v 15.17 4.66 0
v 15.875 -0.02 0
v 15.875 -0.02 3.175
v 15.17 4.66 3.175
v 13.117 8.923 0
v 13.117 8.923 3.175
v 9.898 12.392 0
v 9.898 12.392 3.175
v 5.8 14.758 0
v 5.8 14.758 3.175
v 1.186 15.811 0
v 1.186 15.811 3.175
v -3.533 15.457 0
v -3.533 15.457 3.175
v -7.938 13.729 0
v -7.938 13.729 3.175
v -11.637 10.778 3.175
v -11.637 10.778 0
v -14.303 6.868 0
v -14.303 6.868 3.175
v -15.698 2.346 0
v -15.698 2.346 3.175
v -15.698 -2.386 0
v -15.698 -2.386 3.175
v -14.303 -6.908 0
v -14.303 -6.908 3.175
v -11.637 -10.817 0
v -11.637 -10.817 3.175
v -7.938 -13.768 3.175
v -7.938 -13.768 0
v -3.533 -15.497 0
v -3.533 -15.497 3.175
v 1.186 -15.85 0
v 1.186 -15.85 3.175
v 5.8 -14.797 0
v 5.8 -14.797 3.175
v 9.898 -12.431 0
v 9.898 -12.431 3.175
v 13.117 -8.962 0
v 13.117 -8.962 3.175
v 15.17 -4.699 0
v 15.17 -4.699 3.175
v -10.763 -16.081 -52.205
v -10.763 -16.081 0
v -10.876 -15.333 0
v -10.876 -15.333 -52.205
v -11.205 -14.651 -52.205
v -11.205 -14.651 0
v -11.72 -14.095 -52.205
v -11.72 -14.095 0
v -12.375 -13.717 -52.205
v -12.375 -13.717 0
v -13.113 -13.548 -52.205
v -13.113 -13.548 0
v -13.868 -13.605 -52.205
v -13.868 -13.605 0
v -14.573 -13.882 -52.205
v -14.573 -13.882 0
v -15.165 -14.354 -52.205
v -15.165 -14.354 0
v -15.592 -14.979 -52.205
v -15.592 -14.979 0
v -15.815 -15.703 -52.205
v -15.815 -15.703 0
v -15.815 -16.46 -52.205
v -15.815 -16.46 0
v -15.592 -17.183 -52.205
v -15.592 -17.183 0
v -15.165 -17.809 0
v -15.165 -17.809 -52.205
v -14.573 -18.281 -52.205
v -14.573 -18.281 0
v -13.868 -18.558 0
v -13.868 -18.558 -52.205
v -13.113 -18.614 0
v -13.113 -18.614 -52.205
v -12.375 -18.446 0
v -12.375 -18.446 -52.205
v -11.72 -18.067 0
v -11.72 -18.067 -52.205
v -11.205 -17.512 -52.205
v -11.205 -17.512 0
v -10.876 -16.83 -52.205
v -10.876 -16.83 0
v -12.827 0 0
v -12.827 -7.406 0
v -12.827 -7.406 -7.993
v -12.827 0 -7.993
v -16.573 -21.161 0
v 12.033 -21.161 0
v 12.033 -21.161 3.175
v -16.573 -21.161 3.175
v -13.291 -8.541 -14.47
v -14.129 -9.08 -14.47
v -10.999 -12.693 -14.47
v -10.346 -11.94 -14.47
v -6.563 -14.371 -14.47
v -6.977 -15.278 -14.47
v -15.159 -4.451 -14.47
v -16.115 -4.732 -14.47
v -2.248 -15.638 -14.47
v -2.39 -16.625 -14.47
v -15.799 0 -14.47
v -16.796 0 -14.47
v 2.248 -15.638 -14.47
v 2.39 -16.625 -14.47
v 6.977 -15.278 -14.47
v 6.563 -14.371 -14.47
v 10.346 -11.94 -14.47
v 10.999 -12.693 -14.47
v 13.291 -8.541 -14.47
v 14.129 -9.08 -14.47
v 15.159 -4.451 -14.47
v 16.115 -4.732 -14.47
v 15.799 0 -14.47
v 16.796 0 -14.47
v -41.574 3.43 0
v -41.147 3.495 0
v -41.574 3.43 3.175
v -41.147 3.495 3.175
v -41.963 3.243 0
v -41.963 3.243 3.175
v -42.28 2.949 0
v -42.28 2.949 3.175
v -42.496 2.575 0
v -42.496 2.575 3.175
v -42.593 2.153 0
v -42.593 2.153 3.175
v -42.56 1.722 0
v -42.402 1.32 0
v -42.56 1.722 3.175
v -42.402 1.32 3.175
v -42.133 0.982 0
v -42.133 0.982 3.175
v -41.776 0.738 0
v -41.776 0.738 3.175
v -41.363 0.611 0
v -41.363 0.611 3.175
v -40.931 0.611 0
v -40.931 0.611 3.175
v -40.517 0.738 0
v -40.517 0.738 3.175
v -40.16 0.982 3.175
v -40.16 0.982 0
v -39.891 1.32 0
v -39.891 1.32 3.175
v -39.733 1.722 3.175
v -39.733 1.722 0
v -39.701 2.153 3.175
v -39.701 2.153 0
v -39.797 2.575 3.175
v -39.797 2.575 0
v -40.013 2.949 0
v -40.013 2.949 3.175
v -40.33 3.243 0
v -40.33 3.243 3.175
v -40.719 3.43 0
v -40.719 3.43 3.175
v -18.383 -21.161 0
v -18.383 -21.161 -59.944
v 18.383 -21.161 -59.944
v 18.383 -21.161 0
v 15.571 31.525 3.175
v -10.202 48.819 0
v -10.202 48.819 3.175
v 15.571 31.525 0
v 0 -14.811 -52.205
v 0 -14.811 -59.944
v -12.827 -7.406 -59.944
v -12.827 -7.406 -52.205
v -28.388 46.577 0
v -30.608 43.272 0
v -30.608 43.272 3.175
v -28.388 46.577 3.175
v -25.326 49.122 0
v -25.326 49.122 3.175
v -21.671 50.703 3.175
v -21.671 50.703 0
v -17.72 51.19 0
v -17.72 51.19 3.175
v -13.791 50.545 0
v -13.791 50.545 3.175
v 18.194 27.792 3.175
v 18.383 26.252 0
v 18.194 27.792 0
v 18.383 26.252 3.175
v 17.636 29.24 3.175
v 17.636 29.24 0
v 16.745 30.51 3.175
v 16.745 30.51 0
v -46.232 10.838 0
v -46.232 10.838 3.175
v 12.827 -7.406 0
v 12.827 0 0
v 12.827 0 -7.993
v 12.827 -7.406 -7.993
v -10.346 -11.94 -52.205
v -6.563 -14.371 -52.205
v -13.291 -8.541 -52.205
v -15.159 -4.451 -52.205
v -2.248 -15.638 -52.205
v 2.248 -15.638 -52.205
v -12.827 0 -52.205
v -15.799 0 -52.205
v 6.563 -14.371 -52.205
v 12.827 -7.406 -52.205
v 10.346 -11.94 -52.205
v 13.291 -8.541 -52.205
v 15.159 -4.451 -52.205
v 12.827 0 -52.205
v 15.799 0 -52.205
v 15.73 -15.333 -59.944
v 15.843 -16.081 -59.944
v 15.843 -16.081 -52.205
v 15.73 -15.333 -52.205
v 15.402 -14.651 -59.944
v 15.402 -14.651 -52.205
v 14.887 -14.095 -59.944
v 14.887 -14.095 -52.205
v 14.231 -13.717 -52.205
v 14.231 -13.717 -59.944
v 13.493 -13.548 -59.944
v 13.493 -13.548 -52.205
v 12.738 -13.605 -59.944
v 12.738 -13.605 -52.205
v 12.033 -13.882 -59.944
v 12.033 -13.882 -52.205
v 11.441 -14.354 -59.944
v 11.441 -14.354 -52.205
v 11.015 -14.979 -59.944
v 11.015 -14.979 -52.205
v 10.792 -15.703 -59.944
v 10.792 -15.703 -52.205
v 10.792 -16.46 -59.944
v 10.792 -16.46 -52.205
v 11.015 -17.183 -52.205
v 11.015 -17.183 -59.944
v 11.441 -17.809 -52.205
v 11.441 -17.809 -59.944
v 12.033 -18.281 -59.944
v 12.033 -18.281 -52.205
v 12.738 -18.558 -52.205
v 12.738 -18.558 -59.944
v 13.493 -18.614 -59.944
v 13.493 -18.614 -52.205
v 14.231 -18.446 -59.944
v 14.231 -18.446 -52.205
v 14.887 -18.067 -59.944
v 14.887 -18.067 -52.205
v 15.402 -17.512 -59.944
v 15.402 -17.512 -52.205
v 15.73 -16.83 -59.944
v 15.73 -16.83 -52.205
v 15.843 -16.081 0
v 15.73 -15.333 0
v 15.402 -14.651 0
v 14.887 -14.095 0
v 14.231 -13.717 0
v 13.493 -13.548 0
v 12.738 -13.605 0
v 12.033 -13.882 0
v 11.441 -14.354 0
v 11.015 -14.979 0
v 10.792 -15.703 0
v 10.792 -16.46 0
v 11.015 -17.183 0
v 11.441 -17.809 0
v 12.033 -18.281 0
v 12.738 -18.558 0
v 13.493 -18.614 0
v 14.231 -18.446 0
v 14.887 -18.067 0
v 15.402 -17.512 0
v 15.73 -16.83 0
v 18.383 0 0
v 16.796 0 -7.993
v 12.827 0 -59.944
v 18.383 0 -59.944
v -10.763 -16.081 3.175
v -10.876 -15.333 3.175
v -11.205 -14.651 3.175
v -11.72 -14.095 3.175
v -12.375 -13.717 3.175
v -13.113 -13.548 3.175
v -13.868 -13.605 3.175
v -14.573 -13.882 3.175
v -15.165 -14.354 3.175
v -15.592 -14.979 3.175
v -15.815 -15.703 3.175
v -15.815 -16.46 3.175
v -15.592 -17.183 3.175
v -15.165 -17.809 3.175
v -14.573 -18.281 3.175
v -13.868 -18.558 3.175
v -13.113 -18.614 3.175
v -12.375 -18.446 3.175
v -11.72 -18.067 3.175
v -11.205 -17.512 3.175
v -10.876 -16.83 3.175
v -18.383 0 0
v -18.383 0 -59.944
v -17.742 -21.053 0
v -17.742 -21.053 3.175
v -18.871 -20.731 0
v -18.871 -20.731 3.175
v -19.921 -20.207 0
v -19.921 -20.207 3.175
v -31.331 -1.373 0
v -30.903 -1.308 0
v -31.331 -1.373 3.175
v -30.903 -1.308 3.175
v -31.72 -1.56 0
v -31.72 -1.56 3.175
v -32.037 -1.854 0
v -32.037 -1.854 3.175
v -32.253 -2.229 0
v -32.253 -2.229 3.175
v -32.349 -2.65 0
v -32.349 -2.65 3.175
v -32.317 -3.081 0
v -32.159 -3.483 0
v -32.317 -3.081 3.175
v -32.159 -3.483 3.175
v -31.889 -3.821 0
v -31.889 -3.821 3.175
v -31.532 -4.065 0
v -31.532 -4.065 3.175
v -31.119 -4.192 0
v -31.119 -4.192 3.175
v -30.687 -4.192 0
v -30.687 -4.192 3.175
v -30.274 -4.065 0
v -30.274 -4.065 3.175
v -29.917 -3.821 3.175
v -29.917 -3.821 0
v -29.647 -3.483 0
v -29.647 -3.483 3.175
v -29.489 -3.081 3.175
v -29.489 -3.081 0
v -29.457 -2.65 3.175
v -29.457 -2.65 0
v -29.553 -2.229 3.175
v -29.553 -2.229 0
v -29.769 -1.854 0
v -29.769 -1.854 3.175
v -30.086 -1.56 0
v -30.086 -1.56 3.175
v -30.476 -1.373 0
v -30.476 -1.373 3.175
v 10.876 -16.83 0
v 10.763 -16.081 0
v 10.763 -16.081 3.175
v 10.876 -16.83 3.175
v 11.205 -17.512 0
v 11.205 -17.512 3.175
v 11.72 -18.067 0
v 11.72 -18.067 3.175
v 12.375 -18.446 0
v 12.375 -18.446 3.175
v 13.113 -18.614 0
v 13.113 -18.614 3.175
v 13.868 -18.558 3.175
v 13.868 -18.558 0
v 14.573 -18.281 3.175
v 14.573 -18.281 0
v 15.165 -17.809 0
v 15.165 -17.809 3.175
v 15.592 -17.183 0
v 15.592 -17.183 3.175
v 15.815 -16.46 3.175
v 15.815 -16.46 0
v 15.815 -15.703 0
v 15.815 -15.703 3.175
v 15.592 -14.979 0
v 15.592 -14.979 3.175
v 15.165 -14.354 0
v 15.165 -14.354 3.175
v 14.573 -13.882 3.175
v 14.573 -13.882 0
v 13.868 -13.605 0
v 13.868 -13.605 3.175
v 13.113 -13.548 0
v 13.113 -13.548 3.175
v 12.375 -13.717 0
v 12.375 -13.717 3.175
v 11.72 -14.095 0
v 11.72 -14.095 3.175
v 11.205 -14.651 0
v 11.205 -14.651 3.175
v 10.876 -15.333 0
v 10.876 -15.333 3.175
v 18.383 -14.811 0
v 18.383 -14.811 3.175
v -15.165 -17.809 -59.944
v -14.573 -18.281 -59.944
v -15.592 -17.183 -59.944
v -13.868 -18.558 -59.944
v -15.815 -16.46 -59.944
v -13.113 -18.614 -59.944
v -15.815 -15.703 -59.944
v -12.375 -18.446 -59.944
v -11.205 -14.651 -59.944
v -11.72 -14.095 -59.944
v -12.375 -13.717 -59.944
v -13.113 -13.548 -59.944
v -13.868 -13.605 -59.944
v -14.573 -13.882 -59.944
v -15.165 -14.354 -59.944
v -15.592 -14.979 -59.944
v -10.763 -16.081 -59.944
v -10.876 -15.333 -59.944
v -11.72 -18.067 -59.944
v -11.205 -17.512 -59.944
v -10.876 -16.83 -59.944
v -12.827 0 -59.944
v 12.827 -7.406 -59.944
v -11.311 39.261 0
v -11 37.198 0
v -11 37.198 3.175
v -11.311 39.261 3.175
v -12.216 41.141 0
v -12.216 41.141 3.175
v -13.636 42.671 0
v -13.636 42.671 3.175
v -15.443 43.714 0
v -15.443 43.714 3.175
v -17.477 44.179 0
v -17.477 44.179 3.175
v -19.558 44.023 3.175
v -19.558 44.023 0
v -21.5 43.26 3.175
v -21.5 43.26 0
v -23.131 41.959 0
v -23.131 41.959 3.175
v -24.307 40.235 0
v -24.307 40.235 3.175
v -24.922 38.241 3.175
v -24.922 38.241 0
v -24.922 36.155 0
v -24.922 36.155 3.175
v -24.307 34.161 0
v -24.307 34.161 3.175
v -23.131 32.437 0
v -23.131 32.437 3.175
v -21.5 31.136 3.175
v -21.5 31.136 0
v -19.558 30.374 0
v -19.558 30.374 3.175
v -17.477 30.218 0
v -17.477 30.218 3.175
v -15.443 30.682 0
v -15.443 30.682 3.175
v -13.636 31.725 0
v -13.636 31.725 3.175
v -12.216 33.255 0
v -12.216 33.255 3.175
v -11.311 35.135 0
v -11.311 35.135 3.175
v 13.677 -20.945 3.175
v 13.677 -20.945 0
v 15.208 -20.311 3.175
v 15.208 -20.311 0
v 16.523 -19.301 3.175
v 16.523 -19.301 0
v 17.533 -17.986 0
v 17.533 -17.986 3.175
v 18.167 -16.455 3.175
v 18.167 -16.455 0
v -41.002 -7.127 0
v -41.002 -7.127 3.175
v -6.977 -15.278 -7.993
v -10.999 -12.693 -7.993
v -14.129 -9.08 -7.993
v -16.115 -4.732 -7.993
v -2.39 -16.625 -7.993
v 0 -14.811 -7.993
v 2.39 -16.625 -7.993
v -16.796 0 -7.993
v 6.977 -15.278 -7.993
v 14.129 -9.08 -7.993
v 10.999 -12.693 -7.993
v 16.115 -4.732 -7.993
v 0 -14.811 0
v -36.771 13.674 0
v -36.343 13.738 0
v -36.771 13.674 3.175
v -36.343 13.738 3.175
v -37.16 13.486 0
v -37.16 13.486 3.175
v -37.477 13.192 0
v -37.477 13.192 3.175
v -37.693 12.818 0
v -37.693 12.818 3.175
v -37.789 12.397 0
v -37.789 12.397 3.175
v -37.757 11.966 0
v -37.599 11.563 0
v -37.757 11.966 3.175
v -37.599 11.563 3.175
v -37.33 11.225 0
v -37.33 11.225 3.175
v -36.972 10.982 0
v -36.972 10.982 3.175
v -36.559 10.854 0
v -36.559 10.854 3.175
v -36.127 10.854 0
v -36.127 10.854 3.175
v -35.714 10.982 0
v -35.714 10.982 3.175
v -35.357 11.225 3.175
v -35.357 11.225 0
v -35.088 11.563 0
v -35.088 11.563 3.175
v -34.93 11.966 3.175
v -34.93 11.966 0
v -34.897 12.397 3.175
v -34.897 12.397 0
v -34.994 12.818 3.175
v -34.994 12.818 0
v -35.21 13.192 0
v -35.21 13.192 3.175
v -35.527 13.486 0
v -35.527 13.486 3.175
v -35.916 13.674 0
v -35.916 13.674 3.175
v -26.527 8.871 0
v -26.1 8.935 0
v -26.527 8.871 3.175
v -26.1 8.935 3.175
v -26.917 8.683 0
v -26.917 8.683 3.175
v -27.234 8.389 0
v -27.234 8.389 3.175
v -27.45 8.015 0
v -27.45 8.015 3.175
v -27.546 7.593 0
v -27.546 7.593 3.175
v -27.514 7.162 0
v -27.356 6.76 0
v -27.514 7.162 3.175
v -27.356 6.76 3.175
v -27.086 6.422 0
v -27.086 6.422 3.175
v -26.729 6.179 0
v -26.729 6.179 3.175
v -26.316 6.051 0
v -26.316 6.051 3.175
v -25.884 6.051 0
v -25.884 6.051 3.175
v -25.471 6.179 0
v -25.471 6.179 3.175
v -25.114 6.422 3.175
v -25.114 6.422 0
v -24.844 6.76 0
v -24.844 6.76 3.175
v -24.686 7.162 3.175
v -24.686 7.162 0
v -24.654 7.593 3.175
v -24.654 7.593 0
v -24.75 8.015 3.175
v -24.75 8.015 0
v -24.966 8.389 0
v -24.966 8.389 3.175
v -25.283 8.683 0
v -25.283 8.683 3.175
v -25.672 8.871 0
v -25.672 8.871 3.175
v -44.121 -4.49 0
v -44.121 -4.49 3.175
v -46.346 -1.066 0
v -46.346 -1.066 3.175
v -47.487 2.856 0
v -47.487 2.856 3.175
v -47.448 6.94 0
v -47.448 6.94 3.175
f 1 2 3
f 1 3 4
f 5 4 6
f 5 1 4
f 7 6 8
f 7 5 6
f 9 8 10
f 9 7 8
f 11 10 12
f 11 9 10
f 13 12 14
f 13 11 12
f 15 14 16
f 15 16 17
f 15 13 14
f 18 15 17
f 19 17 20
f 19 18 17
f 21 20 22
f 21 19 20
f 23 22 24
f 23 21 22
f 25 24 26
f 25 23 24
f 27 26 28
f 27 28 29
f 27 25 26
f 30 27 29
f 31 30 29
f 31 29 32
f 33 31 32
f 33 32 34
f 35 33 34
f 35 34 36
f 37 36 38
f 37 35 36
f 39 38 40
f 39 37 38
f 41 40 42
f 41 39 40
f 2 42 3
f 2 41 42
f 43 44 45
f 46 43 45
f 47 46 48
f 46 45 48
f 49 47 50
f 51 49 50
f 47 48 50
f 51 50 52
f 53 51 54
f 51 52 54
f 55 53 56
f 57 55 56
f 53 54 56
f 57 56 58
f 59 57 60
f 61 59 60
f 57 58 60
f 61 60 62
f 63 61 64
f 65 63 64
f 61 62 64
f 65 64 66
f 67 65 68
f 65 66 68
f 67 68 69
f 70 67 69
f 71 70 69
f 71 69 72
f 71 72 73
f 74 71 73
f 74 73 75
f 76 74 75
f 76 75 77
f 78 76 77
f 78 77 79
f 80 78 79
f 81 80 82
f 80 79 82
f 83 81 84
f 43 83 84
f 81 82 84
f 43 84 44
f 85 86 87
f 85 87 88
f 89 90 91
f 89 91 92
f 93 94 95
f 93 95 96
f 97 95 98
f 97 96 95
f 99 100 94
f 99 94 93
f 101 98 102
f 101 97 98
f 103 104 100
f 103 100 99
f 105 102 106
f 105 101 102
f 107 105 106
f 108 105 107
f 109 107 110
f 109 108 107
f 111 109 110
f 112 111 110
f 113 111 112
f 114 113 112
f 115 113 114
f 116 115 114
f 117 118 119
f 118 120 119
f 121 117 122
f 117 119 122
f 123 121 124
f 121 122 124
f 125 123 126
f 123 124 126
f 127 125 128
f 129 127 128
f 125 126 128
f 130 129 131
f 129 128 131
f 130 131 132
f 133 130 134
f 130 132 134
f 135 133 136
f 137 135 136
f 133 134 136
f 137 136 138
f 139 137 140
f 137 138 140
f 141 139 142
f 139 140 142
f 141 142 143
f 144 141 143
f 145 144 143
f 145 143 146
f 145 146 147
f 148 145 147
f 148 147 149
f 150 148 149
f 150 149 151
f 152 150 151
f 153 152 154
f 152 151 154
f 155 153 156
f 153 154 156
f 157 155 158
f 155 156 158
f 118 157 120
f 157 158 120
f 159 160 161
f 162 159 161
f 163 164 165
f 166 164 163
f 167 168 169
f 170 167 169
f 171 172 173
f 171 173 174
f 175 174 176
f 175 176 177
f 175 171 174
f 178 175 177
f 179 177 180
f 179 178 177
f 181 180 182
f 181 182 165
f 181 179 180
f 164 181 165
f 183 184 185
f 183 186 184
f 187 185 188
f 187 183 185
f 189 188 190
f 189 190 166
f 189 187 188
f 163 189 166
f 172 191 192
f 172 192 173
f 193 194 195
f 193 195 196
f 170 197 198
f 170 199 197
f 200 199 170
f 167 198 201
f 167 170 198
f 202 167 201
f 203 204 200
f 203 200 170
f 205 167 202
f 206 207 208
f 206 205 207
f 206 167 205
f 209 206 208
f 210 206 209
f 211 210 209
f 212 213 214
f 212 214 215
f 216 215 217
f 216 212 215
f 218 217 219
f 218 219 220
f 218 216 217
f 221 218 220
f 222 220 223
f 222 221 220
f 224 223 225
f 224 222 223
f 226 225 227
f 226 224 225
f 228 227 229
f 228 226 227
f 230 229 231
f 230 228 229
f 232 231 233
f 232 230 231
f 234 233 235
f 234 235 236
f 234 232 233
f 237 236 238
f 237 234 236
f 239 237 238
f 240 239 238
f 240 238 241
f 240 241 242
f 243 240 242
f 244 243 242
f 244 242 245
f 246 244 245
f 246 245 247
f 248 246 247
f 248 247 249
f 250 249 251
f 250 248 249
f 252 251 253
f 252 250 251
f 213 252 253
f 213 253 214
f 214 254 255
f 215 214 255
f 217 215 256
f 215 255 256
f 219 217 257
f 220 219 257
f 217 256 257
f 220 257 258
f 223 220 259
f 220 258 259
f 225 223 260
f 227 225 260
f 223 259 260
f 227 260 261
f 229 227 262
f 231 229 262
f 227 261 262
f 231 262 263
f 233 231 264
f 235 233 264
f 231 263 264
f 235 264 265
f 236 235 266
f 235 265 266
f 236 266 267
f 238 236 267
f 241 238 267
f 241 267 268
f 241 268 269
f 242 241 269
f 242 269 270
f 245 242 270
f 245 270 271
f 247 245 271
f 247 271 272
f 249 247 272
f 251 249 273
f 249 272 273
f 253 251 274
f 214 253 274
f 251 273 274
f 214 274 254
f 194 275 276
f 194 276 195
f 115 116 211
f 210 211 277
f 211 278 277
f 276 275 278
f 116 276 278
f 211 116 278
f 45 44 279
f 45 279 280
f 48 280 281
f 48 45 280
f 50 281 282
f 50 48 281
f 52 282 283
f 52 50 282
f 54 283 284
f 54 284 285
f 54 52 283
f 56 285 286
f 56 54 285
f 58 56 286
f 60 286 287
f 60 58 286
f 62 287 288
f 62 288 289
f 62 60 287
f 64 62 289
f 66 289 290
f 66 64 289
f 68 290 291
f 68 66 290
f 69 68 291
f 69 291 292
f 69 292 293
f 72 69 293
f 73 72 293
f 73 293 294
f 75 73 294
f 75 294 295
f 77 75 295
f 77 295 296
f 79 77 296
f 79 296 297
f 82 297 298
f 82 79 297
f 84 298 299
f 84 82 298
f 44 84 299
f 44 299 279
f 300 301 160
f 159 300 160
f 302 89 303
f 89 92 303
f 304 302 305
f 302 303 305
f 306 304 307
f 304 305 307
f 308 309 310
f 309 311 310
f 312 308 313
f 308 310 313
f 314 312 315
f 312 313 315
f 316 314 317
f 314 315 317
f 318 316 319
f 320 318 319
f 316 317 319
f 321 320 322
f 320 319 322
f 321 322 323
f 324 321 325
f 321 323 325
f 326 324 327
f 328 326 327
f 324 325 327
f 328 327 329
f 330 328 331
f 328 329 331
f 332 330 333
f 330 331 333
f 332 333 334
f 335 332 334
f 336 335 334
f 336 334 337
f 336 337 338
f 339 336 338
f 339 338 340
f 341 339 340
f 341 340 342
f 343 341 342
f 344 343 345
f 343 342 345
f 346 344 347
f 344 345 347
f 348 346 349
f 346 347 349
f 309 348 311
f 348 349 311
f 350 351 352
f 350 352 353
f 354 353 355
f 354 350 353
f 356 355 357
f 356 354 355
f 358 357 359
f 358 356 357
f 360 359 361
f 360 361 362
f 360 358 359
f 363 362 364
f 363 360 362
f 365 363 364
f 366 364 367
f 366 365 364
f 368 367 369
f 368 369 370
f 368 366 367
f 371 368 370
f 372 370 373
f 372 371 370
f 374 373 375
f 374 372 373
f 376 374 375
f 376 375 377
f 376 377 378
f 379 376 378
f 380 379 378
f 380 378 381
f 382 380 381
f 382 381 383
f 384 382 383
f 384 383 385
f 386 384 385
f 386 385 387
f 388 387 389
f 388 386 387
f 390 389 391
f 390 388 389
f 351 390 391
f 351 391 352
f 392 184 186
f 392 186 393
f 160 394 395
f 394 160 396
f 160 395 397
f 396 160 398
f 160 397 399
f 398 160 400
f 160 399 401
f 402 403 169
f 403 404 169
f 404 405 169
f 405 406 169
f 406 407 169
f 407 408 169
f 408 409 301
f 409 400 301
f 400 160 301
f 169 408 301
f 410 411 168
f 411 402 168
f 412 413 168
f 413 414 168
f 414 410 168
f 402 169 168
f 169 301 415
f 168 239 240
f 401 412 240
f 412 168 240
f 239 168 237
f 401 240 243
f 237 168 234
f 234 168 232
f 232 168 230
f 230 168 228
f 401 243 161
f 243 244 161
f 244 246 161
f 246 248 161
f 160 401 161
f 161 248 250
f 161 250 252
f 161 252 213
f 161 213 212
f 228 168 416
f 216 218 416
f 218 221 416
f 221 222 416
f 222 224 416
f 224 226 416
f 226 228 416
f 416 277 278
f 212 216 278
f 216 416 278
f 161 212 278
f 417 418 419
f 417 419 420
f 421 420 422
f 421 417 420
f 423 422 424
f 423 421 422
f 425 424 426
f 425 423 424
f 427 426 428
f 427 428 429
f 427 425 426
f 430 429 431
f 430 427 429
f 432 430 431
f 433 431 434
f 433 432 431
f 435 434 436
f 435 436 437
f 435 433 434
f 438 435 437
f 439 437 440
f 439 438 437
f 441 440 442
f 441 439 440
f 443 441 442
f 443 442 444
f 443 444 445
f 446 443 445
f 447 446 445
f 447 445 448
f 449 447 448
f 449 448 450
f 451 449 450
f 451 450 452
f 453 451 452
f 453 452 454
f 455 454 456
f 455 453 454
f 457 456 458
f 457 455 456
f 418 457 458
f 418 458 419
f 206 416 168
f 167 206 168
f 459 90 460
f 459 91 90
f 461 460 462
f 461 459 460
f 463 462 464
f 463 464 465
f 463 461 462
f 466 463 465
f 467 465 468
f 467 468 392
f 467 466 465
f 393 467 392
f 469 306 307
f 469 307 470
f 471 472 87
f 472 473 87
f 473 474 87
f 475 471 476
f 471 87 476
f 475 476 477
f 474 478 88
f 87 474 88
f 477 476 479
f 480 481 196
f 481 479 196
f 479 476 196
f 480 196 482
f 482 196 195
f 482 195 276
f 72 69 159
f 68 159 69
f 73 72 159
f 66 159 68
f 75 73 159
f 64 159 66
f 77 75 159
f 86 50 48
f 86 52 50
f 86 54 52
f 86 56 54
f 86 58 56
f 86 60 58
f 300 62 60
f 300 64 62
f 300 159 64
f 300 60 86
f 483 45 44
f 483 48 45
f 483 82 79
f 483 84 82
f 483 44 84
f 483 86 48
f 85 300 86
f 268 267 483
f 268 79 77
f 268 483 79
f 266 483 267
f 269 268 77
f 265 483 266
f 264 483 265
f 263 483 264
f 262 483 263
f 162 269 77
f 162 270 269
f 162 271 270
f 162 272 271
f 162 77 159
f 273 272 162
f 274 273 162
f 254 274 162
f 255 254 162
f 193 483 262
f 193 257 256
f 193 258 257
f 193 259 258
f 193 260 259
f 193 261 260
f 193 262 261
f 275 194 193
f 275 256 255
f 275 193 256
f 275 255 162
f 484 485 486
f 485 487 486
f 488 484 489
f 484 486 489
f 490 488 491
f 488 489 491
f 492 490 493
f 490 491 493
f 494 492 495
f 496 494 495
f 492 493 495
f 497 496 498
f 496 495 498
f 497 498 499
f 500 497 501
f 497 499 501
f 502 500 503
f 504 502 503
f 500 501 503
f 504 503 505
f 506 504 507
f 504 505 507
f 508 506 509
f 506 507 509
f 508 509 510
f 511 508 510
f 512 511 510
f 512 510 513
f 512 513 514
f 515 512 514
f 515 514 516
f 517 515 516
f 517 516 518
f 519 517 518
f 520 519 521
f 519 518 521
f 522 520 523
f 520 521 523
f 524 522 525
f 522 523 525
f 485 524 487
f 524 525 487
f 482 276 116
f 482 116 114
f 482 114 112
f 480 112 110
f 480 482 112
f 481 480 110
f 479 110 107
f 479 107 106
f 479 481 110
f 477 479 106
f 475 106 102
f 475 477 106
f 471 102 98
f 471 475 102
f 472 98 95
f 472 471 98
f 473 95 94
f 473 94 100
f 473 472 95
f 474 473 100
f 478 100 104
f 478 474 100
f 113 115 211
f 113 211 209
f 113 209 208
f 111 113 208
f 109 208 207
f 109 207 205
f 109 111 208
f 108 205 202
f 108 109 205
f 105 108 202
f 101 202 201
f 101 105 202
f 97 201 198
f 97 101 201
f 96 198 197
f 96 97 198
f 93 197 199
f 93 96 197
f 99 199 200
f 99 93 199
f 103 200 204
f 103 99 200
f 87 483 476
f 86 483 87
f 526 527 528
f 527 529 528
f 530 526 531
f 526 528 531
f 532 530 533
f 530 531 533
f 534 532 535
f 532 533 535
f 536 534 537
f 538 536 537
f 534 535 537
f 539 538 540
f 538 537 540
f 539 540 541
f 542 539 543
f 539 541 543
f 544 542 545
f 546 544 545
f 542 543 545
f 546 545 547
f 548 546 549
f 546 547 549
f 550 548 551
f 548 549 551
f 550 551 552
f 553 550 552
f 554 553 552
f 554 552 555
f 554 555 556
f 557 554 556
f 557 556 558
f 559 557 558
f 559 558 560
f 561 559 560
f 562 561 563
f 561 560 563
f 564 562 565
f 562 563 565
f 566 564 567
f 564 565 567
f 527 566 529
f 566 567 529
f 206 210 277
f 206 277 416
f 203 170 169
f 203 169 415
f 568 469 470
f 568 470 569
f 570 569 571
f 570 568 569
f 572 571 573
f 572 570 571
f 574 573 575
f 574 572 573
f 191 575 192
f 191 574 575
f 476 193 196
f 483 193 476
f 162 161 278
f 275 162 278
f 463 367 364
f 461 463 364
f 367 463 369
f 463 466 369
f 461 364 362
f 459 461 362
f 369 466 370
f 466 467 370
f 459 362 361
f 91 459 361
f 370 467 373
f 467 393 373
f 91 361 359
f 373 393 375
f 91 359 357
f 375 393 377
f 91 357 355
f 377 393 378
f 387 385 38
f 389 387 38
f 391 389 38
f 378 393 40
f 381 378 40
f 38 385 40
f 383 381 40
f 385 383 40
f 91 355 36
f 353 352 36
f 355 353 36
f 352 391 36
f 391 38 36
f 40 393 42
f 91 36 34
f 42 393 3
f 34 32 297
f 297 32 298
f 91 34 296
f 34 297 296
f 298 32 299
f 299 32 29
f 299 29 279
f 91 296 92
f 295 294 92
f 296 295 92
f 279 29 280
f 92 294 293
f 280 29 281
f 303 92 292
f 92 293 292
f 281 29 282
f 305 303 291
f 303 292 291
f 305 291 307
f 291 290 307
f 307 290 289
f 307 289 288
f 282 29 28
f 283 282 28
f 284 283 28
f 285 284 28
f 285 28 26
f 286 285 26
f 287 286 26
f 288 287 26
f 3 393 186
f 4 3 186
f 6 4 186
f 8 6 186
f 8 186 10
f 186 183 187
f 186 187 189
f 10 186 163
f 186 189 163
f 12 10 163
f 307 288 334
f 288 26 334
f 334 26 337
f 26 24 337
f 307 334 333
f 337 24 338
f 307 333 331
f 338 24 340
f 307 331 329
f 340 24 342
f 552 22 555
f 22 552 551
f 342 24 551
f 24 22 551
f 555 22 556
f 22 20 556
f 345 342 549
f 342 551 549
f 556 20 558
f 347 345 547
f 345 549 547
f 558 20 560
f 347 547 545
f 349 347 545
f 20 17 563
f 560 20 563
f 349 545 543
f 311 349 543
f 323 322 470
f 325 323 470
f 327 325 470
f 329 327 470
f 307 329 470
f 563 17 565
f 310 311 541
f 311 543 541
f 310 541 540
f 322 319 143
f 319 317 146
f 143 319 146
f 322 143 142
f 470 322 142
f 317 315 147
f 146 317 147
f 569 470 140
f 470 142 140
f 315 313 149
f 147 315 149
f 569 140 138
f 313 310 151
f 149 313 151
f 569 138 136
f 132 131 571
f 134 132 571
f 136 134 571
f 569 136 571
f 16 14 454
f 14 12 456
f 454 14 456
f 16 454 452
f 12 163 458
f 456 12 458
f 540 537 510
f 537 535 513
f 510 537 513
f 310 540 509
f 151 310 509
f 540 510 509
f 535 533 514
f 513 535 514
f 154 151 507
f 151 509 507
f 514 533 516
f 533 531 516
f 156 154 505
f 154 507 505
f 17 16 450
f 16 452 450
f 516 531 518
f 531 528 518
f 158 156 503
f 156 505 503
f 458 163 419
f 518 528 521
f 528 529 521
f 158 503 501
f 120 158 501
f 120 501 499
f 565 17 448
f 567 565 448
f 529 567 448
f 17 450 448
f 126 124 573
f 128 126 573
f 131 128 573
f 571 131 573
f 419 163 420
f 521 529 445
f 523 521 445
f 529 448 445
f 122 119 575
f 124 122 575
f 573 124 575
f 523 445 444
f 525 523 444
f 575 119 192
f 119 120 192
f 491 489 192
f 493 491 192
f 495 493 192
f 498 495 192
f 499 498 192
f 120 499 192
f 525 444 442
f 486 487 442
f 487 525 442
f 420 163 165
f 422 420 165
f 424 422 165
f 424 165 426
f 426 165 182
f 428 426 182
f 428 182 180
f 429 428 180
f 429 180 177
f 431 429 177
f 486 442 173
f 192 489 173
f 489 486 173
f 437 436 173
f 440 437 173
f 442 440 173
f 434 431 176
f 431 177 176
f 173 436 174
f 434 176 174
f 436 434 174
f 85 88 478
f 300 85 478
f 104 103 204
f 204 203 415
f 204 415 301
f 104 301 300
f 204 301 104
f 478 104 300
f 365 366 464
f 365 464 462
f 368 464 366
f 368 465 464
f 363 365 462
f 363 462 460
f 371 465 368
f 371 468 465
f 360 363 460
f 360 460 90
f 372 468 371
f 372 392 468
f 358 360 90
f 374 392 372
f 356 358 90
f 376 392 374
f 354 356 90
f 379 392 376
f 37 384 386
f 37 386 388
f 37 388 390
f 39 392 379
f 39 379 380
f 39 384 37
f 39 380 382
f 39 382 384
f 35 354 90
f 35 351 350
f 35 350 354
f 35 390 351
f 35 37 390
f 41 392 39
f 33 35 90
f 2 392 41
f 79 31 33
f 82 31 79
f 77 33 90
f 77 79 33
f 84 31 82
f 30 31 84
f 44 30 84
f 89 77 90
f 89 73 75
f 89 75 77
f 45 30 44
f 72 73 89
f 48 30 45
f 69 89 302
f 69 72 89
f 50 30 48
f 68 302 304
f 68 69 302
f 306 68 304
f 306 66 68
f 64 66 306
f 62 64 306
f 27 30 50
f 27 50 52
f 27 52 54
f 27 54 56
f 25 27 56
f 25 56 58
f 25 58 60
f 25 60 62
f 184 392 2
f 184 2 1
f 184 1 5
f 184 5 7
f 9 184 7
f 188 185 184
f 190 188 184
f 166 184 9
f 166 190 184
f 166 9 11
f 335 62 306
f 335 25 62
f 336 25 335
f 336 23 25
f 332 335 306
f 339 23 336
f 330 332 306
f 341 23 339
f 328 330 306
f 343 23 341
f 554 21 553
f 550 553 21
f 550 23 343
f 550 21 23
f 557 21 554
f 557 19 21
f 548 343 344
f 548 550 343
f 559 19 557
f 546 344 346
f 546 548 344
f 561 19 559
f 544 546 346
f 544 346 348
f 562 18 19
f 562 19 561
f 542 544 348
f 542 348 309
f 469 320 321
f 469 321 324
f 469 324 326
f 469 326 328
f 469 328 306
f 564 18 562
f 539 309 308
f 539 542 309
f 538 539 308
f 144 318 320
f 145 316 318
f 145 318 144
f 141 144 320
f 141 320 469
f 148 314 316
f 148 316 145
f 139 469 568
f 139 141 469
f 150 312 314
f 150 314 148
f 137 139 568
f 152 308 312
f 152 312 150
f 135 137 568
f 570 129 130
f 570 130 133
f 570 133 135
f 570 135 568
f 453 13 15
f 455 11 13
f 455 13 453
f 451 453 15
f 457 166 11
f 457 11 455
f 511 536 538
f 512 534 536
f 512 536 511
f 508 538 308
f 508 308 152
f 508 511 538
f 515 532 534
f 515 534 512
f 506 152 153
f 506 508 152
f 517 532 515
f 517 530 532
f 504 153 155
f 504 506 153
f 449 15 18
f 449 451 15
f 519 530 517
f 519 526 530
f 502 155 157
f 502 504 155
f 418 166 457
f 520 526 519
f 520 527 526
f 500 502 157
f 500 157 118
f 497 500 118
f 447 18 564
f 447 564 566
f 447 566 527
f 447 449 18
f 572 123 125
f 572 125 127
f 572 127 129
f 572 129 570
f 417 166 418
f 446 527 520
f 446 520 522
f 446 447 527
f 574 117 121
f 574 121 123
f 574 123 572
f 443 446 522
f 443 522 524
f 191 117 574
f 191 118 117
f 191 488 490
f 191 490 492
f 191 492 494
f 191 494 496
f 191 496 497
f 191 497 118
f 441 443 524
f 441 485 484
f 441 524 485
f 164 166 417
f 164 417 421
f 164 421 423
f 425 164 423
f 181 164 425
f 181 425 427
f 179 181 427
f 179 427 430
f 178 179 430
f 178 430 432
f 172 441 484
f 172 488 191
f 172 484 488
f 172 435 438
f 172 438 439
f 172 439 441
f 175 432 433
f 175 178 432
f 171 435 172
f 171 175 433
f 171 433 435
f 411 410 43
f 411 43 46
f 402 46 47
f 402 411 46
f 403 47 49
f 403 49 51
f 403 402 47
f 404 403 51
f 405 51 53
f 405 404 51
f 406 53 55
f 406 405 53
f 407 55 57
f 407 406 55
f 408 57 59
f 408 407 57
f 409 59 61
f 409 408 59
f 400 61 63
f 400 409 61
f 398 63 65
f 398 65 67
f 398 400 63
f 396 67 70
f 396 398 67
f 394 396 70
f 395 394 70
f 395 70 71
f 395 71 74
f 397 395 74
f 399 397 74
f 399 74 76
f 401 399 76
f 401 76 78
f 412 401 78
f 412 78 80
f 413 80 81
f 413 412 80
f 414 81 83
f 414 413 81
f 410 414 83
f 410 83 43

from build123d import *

# Parameters (mm, degrees)
SKETCH1_R                        = 2.54
BOSS_EXTRUDE1_DEPTH              = 7.992618
BOSS_EXTRUDE2_START              = -7.992618
SKETCH1_3_R                      = 2.54
BOSS_EXTRUDE2_DEPTH              = 6.477
BOSS_EXTRUDE4_START              = -59.944
SKETCH1_5_R                      = 2.54
BOSS_EXTRUDE4_DEPTH              = 7.738618
BOSS_EXTRUDE3_START              = -14.469618
SKETCH1_4_R                      = 2.54
BOSS_EXTRUDE3_DEPTH              = 37.735764
SKETCH2_R                        = 2.54
SKETCH2_R_2                      = 15.875
SKETCH2_R_3                      = 7
BOSS_EXTRUDE5_DEPTH              = 3.175
SKETCH3_W                        = 1.45
SKETCH3_H                        = 3.175
M3_5X0_6_TAPPED_HOLE1_AT_2_COUNT = 2
M3_5X0_6_TAPPED_HOLE1_AT_2_PITCH = 11.313708499
M3_5X0_6_TAPPED_HOLE1_AT_3_COUNT = 2
M3_5X0_6_TAPPED_HOLE1_AT_3_PITCH = 16
M3_5X0_6_TAPPED_HOLE1_AT_4_COUNT = 2
M3_5X0_6_TAPPED_HOLE1_AT_4_PITCH = 11.313708499
FILLET1_R                        = 6.35


with BuildPart() as part:
    # Sketch1 → Boss-Extrude1 (new body)
    with BuildSketch(Plane.XY):
        Polygon((-12.827, -7.405671903), (-12.827, 0), (-18.38325, 0), (-18.38325, -21.161343806), (18.38325, -21.161343806), (18.38325, 0), (12.827, 0), (12.827, -7.405671903), (0, -14.811343806), align=None)
        with Locations((13.30325, -16.081343806)):
            Circle(SKETCH1_R, mode=Mode.SUBTRACT)
        with Locations((-13.30325, -16.081343806)):
            Circle(SKETCH1_R, mode=Mode.SUBTRACT)
    extrude(amount=-BOSS_EXTRUDE1_DEPTH)

    # Sketch1<3> → Boss-Extrude2 (add)
    with BuildSketch(Plane.XY.offset(BOSS_EXTRUDE2_START)):
        with BuildLine():
            ThreePointArc((16.79575, 0), (0, -16.79575), (-16.79575, 0))
            Line((-16.79575, 0), (-18.38325, 0))
            Line((-18.38325, 0), (-18.38325, -21.161343806))
            Line((-18.38325, -21.161343806), (18.38325, -21.161343806))
            Line((18.38325, -21.161343806), (18.38325, 0))
            Line((18.38325, 0), (16.79575, 0))
        make_face()
        with Locations((-13.30325, -16.081343806)):
            Circle(SKETCH1_3_R, mode=Mode.SUBTRACT)
        with Locations((13.30325, -16.081343806)):
            Circle(SKETCH1_3_R, mode=Mode.SUBTRACT)
    extrude(amount=-BOSS_EXTRUDE2_DEPTH)

    # Sketch1<4> → Boss-Extrude3 (add)
    with BuildSketch(Plane.XY.offset(BOSS_EXTRUDE3_START)):
        with BuildLine():
            ThreePointArc((15.7988, 0), (0, -15.7988), (-15.7988, 0))
            Line((-15.7988, 0), (-18.38325, 0))
            Line((-18.38325, 0), (-18.38325, -21.161343806))
            Line((-18.38325, -21.161343806), (18.38325, -21.161343806))
            Line((18.38325, -21.161343806), (18.38325, 0))
            Line((18.38325, 0), (15.7988, 0))
        make_face()
        with Locations((13.30325, -16.081343806)):
            Circle(SKETCH1_4_R, mode=Mode.SUBTRACT)
        with Locations((-13.30325, -16.081343806)):
            Circle(SKETCH1_4_R, mode=Mode.SUBTRACT)
    extrude(amount=-BOSS_EXTRUDE3_DEPTH)


with BuildPart() as body_2:
    # Sketch1<5> → Boss-Extrude4 (new body)
    with BuildSketch(Plane.XY.offset(BOSS_EXTRUDE4_START)):
        Polygon((-12.827, -7.405671903), (-12.827, 0), (-18.38325, 0), (-18.38325, -21.161343806), (18.38325, -21.161343806), (18.38325, 0), (12.827, 0), (12.827, -7.405671903), (0, -14.811343806), align=None)
        with Locations((13.30325, -16.081343806)):
            Circle(SKETCH1_5_R, mode=Mode.SUBTRACT)
        with Locations((-13.30325, -16.081343806)):
            Circle(SKETCH1_5_R, mode=Mode.SUBTRACT)
    extrude(amount=BOSS_EXTRUDE4_DEPTH)


with BuildPart() as part_1:
    add(part.part)

    # Combine1: union body 2
    add(body_2.part)


with BuildPart() as body_2_2:
    # Sketch2 → Boss-Extrude5 (new body)
    with BuildSketch(Plane.XY):
        with BuildLine():
            Line((18.38325, -21.161343806), (-18.38325, -21.161343806))
            Line((-18.38325, -21.161343806), (-41.001883978, -7.126958523))
            ThreePointArc((-41.001883978, -7.126958523), (-47.06048262, 0.853254126), (-46.231666072, 10.838416846))
            Line((-46.231666072, 10.838416846), (-30.608416072, 43.271641469))
            ThreePointArc((-30.608416072, 43.271641469), (-21.67147957, 50.702926717), (-10.202170361, 48.819371375))
            Line((-10.202170361, 48.819371375), (18.38325, 29.638656194))
            Line((18.38325, 29.638656194), (18.38325, -21.161343806))
        make_face()
        with Locations((-13.30325, -16.081343806)):
            Circle(SKETCH2_R, mode=Mode.SUBTRACT)
        with Locations(Location((13.30325, -16.081343806, 0), (0, 0, 180))):
            Circle(SKETCH2_R, mode=Mode.SUBTRACT)
        with Locations((0, -0.019646968)):
            Circle(SKETCH2_R_2, mode=Mode.SUBTRACT)
        with Locations((-18, 37.198103032)):
            Circle(SKETCH2_R_3, mode=Mode.SUBTRACT)
    extrude(amount=BOSS_EXTRUDE5_DEPTH)

    # Sketch3 → M3.5x0.6 Tapped Hole1 (revolve, cut)
    with BuildSketch(Plane(origin=(-26.099885072, 7.484985053, 0), x_dir=(0, 1, 0), z_dir=(1, 0, 0))):
        with Locations((0.725, 1.5875)):
            Rectangle(SKETCH3_W, SKETCH3_H)
    m3_5x0_6_tapped_hole1 = revolve(axis=Axis((-26.099885072, 7.484985053, -6.35), (0, 0, 1)), mode=Mode.SUBTRACT)

    # M3.5x0.6 Tapped Hole1 at 2: M3.5x0.6 Tapped Hole1 ×2
    with Locations(*[Vector(-0.9054035264513098, 0.4245520631083216, 0) * (i * M3_5X0_6_TAPPED_HOLE1_AT_2_PITCH) for i in range(1, M3_5X0_6_TAPPED_HOLE1_AT_2_COUNT)]):
        add(m3_5x0_6_tapped_hole1, mode=Mode.SUBTRACT)

    # M3.5x0.6 Tapped Hole1 at 3: M3.5x0.6 Tapped Hole1 ×2
    with Locations(*[Vector(-0.9404206160545683, -0.34001333047330123, 0) * (i * M3_5X0_6_TAPPED_HOLE1_AT_3_PITCH) for i in range(1, M3_5X0_6_TAPPED_HOLE1_AT_3_COUNT)]):
        add(m3_5x0_6_tapped_hole1, mode=Mode.SUBTRACT)

    # M3.5x0.6 Tapped Hole1 at 4: M3.5x0.6 Tapped Hole1 ×2
    with Locations(*[Vector(-0.42455206310832183, -0.9054035264513097, 0) * (i * M3_5X0_6_TAPPED_HOLE1_AT_4_PITCH) for i in range(1, M3_5X0_6_TAPPED_HOLE1_AT_4_COUNT)]):
        add(m3_5x0_6_tapped_hole1, mode=Mode.SUBTRACT)

    # Fillet1
    fillet1_edges = [body_2_2.edges().sort_by_distance(p)[0] for p in [
        (18.38325, -21.161343806, 1.5875),
        (-18.38325, -21.161343806, 1.5875),
        (18.38325, 29.638656194, 1.5875),
    ]]
    fillet(fillet1_edges, radius=FILLET1_R)


solid = Compound([part_1.part, body_2_2.part])
